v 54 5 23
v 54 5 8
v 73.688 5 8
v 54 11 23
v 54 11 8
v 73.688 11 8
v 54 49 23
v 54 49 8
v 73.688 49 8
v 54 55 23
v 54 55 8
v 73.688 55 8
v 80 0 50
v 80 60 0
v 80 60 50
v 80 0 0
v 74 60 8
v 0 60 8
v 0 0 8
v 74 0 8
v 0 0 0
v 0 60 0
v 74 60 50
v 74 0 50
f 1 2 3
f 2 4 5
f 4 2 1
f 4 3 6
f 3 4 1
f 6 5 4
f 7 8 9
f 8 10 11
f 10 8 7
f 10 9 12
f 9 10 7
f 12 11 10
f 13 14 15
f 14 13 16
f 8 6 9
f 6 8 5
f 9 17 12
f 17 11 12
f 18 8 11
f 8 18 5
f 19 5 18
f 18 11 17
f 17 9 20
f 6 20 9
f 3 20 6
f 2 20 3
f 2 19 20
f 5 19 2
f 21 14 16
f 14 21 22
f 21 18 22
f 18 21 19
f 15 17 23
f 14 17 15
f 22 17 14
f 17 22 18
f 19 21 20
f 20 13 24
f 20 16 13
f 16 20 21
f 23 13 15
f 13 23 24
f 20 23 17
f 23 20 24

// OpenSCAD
$fn = 32;

// ----------------------------------------------------------------------
// Rib bracket: 2-gusset L bracket
// ----------------------------------------------------------------------

// --- parameters (mm) ---
base_l = 80;              // foot length, X
base_w = 60;              // foot width, Y
base_t = 8;               // foot thickness
plate_t = 6;              // upright plate thickness
plate_h = 50;             // overall height
gus_l = 20;               // gusset leg along the foot
gus_h = 16;               // gusset height
gus_t = 6;                // gusset thickness
gus_edge = 5;             // gusset margin from the foot edge
n_gus = 2;                // gusset count
fit_tol = 0.1;            // tolerance for press fits, mm
free_tol = 0.3;           // tolerance for clearance fits, mm

gus_pitch = (base_w - 2 * gus_edge - gus_t) / (n_gus - 1);  // gusset pitch

union() {
  cube([base_l, base_w, base_t]);
  translate([base_l - plate_t, 0, base_t - 1])
    cube([plate_t, base_w, plate_h - base_t + 1]);
  for (i = [0 : n_gus - 1])
    translate([base_l - plate_t - gus_l, gus_edge + i * gus_pitch, base_t - 1])
      rotate([-90, 0, 0])
        linear_extrude(height = gus_t)
          polygon(points = [[0, 0], [gus_l + 1, 0], [0, -gus_h]]);
}
